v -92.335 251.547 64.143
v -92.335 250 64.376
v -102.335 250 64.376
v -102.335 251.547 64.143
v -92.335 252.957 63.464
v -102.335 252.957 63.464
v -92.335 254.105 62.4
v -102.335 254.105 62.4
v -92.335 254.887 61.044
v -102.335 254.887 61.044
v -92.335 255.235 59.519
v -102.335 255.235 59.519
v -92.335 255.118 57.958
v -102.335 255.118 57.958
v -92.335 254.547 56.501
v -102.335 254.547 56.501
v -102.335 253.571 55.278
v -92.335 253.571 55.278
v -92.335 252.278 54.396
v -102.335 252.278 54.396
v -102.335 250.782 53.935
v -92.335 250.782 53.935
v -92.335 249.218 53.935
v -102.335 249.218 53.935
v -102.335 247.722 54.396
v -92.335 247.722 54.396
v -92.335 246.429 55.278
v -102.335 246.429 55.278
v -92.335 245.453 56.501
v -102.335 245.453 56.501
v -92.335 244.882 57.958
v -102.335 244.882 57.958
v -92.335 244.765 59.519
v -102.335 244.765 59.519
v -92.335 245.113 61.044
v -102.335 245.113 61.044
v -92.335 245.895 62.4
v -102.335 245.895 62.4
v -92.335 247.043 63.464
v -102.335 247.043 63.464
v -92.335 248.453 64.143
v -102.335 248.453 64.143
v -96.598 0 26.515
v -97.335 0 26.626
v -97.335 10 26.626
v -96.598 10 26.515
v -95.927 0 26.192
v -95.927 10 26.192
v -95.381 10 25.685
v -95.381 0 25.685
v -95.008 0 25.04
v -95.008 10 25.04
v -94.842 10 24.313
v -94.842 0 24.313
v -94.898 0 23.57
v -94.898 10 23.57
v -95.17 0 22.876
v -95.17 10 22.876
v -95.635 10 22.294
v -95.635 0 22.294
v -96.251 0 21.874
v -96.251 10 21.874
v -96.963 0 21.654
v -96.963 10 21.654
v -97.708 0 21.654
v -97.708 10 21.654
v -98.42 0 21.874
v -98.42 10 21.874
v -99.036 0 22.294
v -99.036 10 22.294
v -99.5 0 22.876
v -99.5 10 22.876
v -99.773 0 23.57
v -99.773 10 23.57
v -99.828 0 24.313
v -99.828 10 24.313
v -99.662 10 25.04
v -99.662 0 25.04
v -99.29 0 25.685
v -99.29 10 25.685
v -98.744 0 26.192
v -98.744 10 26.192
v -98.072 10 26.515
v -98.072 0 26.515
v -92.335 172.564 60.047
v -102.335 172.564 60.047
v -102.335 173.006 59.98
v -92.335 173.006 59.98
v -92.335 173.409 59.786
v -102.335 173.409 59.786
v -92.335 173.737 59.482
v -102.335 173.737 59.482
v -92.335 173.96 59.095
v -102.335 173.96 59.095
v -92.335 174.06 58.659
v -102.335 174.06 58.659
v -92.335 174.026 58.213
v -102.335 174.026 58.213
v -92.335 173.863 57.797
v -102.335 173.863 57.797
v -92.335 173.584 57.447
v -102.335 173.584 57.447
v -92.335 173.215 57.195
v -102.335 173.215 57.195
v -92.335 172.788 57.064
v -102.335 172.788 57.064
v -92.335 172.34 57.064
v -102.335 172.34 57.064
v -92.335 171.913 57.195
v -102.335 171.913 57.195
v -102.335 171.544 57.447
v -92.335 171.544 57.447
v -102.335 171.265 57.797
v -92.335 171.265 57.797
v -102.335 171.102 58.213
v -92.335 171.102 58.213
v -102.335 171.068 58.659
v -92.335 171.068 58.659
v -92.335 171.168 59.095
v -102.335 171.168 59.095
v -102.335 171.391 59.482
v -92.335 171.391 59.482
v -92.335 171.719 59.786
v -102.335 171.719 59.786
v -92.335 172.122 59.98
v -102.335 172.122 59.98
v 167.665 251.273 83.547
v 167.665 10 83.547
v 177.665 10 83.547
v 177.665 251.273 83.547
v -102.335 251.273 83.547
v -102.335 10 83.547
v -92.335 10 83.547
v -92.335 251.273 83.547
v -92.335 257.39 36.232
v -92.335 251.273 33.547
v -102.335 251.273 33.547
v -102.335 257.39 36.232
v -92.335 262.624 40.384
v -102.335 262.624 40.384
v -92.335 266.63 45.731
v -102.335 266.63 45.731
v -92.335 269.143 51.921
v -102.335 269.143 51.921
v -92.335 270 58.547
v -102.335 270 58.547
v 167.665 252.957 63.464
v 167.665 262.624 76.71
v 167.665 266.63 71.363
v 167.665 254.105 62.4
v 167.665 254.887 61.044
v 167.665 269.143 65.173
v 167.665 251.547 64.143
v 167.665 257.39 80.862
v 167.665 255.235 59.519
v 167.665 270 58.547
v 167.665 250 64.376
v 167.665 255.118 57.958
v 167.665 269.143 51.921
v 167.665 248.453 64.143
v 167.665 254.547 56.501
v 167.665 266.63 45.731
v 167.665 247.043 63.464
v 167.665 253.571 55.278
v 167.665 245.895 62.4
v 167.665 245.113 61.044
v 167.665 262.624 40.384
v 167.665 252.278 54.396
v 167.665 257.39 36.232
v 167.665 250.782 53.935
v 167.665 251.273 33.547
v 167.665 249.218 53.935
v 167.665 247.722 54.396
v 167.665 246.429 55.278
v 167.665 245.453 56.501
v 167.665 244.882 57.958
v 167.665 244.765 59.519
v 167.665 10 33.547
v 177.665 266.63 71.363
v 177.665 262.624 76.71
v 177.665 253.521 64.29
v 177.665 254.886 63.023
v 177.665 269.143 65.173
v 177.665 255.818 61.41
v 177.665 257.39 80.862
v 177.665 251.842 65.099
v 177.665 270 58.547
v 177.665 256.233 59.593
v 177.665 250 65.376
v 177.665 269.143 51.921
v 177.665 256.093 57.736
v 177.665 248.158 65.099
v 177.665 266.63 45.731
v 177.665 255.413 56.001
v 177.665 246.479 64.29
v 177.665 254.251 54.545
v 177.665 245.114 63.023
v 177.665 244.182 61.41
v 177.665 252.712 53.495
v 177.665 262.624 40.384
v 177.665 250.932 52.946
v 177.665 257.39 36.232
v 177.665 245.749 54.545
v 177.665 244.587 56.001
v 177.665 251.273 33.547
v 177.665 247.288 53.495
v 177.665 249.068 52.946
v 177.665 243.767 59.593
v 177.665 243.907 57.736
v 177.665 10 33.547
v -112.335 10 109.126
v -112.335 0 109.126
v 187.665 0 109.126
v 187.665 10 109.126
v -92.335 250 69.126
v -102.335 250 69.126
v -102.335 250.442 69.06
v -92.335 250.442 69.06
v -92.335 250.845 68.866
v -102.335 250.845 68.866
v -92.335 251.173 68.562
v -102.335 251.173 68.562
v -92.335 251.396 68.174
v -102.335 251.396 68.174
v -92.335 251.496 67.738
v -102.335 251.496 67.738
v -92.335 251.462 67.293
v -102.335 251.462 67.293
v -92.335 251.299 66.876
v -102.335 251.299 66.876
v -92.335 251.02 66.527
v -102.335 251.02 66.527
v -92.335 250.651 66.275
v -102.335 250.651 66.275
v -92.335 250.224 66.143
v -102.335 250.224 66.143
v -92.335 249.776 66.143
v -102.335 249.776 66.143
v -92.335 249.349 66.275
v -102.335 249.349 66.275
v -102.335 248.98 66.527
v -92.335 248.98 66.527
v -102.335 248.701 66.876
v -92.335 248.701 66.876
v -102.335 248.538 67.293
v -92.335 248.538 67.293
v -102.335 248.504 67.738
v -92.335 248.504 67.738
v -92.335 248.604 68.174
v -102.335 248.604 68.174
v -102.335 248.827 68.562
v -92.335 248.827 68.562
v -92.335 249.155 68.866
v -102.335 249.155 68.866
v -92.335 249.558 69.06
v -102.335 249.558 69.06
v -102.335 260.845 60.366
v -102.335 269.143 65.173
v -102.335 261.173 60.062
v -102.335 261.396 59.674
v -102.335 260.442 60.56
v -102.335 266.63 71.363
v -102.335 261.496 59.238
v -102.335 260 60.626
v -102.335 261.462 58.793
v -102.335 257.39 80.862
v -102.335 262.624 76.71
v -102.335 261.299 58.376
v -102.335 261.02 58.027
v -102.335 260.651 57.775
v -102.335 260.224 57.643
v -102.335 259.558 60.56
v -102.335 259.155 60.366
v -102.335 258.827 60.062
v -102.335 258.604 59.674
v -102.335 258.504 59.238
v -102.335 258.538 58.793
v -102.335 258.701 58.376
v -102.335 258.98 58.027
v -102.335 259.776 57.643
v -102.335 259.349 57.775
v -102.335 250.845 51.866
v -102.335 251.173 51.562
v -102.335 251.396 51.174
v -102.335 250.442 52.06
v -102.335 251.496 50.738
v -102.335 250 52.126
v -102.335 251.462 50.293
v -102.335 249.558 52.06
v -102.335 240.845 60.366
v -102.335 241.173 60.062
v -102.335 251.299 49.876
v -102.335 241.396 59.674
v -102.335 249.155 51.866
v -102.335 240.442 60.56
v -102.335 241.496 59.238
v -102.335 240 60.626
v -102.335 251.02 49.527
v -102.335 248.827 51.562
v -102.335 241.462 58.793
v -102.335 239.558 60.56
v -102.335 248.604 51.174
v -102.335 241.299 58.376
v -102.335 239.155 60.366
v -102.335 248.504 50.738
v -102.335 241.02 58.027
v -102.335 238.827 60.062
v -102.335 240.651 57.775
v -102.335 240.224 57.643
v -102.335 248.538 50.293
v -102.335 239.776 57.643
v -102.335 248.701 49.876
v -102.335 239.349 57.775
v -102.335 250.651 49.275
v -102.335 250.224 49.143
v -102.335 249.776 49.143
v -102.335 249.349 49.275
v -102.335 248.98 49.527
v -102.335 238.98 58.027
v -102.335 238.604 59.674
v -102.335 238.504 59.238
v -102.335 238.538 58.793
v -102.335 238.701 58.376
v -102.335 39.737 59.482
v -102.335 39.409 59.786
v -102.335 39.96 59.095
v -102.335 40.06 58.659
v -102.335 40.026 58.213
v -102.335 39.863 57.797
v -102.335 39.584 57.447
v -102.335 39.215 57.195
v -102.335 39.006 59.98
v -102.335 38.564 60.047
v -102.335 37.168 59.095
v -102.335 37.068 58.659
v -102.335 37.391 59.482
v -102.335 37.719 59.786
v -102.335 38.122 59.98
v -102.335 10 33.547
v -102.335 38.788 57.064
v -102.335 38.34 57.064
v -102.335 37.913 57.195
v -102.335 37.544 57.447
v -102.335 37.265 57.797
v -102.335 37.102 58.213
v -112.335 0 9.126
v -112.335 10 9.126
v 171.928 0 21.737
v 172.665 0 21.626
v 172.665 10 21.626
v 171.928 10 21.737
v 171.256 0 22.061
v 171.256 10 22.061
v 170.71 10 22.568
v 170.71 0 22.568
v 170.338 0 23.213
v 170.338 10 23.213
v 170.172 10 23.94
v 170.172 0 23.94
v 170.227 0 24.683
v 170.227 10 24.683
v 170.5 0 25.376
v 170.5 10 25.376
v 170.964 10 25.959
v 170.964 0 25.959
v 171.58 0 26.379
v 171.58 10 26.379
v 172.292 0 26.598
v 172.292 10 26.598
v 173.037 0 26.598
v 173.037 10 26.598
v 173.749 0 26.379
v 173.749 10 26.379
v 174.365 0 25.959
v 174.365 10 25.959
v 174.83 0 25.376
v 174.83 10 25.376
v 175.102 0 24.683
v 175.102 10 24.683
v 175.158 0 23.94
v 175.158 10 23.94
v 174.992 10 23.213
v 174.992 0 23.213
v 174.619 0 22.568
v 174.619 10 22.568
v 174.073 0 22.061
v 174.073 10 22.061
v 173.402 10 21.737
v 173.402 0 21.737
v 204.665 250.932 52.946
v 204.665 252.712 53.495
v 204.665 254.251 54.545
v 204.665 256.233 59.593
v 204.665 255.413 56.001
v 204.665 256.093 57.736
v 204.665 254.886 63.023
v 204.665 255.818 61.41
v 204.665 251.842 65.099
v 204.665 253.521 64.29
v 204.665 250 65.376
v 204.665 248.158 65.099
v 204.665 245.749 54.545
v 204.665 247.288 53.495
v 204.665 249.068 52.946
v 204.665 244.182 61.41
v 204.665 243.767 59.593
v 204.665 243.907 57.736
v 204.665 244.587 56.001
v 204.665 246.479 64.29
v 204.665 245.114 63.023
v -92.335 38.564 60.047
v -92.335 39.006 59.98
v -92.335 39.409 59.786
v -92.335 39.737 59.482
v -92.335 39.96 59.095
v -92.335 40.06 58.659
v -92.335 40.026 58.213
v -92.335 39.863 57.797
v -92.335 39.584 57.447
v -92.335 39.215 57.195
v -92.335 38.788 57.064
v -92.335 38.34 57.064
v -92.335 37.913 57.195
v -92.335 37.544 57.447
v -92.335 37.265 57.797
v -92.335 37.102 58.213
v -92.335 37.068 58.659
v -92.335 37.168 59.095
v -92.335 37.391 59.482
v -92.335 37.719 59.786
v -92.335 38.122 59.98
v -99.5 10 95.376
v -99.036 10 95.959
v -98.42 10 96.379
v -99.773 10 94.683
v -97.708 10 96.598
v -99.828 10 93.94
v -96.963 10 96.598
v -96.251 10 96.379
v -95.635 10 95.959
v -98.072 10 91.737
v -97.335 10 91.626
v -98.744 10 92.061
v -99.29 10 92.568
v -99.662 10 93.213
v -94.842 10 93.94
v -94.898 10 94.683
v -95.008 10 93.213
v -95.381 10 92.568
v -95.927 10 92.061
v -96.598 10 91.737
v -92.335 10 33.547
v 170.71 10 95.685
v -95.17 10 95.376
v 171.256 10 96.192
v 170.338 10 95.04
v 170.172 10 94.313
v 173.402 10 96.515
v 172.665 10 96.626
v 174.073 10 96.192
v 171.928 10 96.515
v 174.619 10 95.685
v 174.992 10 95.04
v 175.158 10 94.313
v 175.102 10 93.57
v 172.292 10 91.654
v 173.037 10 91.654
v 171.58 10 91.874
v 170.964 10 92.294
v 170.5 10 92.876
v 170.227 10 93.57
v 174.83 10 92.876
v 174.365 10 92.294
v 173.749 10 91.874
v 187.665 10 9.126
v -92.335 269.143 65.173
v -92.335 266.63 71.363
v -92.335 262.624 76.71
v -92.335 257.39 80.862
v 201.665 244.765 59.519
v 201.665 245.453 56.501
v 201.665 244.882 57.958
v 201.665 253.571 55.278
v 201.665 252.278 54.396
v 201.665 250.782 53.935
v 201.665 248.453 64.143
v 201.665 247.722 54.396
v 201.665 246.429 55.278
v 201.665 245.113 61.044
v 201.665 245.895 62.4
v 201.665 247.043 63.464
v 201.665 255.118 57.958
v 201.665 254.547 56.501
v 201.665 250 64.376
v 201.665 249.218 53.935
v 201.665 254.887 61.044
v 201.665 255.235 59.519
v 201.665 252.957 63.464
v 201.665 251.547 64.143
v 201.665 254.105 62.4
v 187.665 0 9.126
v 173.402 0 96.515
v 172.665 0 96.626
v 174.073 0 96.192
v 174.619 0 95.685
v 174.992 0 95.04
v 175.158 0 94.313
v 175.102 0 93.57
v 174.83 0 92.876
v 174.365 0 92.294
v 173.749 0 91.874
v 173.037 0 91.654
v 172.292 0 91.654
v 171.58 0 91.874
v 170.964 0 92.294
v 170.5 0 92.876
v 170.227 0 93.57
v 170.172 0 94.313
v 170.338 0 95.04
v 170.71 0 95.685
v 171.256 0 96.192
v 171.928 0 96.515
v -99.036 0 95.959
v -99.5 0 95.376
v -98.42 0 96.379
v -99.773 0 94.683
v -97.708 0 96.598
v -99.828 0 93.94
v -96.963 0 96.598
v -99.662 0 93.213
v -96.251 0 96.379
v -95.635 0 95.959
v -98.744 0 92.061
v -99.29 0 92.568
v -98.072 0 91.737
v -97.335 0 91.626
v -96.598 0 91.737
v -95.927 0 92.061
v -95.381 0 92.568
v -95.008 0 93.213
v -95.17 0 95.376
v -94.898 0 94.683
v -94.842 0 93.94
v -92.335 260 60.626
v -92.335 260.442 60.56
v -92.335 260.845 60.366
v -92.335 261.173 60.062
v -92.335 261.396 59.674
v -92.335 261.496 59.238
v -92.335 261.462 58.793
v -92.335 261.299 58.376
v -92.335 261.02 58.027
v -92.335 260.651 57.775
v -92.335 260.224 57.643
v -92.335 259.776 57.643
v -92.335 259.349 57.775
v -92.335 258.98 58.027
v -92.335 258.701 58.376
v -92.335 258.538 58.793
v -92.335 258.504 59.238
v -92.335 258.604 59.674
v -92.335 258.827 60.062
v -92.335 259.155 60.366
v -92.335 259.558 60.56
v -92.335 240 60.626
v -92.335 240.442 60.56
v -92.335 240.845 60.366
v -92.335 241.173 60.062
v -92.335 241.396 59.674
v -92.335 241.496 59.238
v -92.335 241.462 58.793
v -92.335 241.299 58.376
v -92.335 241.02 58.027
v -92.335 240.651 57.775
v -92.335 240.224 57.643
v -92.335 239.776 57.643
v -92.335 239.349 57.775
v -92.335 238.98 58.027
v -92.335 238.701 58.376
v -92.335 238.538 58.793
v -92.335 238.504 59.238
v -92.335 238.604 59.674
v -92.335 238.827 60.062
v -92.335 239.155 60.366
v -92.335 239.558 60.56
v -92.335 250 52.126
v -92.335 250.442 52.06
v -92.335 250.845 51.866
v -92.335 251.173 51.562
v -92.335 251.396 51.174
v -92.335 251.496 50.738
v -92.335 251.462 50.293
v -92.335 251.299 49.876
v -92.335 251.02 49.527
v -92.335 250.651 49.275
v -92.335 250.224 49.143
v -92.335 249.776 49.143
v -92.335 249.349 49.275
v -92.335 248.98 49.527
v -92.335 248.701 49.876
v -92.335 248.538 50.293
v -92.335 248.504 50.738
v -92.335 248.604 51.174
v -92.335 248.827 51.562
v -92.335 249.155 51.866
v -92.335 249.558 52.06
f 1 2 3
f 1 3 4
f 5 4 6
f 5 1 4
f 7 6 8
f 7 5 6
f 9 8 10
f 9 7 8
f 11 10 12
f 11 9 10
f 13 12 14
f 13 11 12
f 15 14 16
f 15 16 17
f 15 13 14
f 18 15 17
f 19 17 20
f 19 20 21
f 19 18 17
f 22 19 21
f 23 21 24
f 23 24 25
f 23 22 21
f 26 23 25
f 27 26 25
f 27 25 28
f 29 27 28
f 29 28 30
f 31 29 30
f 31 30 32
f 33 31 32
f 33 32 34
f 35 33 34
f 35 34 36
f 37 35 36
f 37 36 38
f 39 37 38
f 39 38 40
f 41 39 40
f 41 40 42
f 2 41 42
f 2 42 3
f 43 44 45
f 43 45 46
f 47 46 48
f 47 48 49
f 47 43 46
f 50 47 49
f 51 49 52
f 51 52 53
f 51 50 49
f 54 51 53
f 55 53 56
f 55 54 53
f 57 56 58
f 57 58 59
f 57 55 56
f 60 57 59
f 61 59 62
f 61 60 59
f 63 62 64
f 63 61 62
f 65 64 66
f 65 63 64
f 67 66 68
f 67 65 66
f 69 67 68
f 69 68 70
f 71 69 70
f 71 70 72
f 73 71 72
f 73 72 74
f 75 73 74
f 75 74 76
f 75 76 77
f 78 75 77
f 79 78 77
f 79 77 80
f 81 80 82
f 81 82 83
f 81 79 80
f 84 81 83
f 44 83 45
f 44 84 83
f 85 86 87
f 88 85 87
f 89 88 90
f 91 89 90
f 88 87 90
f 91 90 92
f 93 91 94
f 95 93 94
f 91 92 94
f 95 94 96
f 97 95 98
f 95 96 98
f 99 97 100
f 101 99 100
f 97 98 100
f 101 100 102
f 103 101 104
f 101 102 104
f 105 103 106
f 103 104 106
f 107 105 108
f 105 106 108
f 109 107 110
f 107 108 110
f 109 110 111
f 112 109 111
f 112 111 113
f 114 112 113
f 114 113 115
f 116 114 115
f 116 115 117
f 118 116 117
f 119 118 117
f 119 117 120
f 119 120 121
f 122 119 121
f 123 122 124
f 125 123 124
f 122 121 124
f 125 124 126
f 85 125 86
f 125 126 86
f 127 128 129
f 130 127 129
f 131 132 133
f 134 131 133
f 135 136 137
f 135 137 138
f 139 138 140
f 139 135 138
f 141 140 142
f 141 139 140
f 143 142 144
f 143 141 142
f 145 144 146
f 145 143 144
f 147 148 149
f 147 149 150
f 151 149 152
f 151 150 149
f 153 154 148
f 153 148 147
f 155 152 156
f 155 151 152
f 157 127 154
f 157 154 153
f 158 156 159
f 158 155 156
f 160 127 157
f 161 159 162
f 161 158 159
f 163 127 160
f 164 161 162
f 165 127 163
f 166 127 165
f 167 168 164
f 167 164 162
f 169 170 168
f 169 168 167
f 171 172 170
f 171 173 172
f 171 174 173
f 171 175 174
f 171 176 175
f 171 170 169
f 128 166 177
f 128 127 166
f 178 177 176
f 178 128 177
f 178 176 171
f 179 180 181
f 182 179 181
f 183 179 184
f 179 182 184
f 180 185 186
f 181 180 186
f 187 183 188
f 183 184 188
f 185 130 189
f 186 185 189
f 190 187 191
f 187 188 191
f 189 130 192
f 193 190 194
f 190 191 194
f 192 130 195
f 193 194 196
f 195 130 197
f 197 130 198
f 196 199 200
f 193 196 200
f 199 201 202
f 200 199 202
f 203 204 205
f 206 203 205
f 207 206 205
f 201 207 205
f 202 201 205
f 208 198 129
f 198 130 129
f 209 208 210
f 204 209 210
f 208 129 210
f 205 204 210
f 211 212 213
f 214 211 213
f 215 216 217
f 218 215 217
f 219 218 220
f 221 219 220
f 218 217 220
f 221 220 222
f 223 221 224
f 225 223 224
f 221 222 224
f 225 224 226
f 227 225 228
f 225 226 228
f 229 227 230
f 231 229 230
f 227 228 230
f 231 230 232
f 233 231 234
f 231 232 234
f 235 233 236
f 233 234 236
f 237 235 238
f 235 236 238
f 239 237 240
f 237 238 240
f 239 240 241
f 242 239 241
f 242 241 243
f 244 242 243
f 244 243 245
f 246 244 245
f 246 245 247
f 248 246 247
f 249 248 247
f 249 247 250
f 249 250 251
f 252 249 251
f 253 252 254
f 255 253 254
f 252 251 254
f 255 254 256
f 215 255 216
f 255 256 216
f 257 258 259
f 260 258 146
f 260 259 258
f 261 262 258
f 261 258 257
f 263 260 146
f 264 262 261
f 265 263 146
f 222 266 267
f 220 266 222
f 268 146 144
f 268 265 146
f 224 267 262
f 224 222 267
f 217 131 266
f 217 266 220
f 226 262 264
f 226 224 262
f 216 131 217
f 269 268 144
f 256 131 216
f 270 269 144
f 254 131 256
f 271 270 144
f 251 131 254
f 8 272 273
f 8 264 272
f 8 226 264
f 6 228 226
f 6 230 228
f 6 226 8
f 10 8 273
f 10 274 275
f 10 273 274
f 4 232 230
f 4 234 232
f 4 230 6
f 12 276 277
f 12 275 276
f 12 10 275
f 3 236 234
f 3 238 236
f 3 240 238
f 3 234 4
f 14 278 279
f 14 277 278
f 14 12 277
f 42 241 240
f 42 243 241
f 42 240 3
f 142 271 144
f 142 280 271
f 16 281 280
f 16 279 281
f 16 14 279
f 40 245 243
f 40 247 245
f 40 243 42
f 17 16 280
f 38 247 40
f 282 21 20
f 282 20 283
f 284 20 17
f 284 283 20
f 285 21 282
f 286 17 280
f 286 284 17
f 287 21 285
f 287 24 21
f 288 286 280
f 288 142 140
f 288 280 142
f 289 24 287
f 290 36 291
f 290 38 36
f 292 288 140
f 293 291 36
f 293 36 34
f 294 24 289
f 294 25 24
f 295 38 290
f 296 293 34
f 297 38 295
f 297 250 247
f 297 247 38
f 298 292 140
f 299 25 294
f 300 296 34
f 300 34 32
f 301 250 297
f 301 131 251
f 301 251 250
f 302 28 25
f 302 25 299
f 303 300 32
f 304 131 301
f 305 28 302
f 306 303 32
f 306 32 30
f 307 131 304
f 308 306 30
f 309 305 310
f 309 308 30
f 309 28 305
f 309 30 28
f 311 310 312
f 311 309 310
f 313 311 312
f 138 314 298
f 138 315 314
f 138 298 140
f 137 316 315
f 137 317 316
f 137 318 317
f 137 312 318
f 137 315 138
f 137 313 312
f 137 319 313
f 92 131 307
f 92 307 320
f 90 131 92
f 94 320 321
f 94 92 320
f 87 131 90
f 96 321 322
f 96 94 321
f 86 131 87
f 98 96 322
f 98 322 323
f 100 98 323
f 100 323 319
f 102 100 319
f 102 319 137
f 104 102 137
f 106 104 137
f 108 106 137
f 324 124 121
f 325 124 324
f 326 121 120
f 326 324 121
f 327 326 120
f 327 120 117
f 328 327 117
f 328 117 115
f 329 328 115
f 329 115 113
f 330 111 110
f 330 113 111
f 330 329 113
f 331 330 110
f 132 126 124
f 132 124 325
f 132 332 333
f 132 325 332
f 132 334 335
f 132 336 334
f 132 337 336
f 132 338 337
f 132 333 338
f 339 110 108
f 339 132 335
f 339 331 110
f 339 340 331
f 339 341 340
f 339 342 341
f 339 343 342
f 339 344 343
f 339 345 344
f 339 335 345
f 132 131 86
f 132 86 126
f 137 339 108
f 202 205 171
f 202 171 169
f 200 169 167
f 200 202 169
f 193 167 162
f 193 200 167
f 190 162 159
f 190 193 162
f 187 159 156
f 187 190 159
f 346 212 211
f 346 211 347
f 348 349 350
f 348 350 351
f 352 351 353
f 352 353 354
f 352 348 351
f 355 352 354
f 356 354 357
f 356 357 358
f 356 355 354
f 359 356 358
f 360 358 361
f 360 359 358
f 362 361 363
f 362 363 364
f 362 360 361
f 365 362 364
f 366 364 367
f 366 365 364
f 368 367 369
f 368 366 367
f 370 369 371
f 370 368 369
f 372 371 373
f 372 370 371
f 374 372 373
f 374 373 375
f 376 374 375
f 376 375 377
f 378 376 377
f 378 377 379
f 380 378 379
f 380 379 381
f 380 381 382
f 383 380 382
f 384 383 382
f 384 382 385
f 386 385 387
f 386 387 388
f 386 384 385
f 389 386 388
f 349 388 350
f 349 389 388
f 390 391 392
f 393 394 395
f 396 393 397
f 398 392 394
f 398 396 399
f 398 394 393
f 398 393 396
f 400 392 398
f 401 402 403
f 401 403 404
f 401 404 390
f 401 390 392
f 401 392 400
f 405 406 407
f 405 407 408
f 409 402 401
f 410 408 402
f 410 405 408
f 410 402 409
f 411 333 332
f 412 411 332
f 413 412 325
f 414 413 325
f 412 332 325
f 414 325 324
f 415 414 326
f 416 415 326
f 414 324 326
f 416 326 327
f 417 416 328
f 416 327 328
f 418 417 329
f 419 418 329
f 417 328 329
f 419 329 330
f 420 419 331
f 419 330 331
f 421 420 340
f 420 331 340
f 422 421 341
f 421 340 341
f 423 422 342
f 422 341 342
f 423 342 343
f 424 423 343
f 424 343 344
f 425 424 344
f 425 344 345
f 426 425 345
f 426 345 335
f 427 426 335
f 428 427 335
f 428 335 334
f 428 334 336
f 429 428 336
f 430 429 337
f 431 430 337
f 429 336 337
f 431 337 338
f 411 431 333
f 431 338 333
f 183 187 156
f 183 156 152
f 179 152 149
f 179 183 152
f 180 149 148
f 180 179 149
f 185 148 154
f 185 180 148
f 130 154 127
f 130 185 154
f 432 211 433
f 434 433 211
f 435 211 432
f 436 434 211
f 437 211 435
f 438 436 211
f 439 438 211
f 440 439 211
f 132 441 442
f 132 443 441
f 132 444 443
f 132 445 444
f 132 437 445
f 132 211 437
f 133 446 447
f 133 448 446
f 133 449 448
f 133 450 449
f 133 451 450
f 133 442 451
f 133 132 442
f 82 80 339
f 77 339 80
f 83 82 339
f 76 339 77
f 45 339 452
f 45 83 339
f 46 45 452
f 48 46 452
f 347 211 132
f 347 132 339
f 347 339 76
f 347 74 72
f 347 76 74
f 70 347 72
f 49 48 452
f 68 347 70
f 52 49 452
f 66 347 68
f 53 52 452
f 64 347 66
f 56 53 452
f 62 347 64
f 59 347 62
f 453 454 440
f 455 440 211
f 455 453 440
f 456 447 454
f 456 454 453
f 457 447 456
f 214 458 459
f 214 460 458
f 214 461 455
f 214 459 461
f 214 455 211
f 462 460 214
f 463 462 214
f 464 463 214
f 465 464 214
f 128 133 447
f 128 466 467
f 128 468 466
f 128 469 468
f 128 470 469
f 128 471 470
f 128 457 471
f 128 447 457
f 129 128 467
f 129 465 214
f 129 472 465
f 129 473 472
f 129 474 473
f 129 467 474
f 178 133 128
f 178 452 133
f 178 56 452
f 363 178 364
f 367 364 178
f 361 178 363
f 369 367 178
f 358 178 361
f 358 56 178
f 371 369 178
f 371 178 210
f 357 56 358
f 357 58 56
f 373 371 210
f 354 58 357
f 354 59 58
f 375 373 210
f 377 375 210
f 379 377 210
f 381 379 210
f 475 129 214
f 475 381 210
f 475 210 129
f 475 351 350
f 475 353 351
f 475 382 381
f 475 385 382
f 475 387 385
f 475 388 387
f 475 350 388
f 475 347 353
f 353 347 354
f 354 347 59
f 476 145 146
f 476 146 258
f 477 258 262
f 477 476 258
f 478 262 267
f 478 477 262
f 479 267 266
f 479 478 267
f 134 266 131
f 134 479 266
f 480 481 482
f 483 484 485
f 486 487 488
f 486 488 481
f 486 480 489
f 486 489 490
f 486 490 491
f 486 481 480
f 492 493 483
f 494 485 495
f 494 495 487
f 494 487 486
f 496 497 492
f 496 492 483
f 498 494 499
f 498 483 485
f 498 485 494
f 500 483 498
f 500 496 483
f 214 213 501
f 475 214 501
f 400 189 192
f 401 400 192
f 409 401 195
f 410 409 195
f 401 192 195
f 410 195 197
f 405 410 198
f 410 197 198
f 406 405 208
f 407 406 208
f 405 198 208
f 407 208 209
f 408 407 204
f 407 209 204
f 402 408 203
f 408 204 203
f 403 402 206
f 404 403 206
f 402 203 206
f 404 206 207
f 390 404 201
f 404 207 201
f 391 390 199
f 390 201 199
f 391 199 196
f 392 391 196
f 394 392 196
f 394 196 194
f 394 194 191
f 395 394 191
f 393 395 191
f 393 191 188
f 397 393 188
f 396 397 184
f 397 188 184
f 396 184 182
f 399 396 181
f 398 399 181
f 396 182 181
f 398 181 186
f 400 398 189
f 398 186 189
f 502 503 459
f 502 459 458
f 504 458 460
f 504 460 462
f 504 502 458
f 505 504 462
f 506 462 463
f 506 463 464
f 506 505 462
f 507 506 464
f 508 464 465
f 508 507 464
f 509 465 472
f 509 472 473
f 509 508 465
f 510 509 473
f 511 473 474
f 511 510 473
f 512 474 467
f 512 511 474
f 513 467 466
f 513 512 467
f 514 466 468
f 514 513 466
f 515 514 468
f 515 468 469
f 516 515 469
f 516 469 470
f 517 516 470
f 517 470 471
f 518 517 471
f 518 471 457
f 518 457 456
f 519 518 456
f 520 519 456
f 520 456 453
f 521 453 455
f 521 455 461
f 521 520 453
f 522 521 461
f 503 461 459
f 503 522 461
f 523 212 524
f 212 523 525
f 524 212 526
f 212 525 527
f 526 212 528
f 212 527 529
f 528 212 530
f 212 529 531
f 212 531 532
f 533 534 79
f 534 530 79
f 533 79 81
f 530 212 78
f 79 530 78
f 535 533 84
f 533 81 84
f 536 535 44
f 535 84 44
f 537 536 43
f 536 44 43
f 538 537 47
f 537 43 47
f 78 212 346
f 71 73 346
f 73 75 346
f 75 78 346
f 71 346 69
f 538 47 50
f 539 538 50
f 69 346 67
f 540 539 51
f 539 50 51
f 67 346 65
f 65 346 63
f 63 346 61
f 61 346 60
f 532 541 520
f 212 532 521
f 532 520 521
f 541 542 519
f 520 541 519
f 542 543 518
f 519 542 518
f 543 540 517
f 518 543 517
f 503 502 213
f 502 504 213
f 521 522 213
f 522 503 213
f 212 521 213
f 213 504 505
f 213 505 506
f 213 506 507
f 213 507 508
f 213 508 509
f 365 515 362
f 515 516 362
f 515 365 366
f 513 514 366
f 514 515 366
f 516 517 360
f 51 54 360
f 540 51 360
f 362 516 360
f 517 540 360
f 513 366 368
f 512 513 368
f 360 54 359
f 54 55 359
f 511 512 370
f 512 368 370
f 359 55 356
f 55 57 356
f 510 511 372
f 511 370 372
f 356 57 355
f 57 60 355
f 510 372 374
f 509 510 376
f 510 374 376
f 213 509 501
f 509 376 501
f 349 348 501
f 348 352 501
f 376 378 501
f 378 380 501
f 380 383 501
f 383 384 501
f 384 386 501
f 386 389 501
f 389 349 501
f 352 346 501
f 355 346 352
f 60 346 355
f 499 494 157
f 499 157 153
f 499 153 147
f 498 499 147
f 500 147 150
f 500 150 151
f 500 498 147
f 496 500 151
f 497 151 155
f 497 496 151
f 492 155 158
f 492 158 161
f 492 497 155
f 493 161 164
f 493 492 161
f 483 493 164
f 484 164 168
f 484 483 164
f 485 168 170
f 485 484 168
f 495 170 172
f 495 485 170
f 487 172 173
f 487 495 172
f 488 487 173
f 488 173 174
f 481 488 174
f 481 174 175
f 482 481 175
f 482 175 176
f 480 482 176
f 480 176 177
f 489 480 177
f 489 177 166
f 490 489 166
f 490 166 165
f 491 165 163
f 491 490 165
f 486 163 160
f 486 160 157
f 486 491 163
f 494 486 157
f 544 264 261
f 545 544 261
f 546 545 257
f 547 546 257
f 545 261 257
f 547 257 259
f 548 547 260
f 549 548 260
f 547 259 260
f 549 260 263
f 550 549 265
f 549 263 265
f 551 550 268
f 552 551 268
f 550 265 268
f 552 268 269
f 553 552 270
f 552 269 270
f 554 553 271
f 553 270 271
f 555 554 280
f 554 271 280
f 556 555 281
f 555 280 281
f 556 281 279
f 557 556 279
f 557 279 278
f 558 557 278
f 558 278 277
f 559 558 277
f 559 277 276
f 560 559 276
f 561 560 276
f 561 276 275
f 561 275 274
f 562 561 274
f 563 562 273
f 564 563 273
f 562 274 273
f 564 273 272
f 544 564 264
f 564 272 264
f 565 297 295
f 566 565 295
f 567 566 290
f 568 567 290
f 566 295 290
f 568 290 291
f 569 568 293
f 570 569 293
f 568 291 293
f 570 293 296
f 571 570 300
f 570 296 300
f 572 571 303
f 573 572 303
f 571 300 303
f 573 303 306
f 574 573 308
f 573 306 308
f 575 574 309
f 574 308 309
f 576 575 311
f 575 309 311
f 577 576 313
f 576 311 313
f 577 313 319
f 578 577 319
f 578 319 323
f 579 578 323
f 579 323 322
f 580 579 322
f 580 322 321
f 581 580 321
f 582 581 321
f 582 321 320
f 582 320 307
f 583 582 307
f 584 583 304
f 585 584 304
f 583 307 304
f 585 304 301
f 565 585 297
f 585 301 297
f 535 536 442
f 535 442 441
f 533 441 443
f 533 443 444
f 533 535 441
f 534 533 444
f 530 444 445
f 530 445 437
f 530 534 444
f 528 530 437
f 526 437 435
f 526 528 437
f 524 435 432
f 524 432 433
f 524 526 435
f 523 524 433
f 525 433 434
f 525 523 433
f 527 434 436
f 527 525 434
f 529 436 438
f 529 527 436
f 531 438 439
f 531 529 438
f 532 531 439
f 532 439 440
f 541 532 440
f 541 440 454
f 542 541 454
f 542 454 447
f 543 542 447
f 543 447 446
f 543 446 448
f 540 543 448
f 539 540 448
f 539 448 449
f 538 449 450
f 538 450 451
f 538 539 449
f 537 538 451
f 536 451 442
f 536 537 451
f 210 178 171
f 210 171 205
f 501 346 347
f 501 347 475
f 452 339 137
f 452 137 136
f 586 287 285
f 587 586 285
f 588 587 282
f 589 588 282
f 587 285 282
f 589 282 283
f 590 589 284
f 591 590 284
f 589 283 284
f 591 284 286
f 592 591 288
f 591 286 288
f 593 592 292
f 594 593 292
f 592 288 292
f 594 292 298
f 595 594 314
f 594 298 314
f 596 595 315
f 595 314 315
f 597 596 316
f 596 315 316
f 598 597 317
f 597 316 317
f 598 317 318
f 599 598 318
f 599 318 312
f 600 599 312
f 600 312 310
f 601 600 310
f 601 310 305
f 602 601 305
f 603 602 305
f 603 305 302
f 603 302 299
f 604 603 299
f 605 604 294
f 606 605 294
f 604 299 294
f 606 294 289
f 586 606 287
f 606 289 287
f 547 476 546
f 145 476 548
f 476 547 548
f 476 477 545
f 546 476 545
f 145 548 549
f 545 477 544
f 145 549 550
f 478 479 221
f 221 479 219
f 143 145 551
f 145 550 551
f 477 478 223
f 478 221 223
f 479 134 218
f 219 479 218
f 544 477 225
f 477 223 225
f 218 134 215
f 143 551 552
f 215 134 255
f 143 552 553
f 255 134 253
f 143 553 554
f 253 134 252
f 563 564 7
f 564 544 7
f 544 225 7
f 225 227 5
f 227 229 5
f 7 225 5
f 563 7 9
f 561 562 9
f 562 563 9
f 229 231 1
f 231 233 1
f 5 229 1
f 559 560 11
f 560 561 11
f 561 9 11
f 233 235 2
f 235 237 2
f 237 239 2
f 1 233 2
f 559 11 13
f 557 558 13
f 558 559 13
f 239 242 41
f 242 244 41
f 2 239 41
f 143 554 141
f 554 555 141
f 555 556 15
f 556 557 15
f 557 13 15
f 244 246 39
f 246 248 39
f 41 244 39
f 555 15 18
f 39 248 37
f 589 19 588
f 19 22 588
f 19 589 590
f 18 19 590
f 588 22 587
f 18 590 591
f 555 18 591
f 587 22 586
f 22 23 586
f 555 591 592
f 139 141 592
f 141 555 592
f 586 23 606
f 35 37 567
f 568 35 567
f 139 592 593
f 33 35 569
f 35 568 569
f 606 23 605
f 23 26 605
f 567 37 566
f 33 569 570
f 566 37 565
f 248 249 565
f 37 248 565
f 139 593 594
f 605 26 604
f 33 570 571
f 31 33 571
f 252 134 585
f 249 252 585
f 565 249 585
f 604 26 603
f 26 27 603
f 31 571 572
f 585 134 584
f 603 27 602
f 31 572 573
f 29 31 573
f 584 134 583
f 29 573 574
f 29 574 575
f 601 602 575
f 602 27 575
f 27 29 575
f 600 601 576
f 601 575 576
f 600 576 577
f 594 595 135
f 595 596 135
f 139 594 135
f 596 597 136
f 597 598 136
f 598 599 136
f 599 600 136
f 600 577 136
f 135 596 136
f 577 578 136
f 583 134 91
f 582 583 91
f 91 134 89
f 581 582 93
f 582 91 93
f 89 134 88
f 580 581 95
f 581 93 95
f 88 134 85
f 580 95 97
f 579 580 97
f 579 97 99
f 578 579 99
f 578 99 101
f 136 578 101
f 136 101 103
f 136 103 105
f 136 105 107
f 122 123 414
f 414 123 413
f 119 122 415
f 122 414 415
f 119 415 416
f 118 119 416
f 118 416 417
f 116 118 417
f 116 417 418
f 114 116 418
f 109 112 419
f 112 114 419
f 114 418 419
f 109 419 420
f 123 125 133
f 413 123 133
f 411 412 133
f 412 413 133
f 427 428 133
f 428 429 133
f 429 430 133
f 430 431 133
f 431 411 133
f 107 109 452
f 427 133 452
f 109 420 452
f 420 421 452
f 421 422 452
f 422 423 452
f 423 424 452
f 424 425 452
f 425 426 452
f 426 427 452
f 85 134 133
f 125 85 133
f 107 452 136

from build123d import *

# Parameters (mm, degrees)
SKETCH1_W               = 300
SKETCH1_H               = 100
SKETCH1_R               = 2.5
BOSS_EXTRUDE1_DEPTH     = 10
SKETCH2_W               = 10
SKETCH2_H               = 50
BOSS_EXTRUDE2_DEPTH     = 260
SKETCH3_R               = 5.25
CUT_EXTRUDE1_DEPTH      = 20
CUT_EXTRUDE2_DEPTH      = 411.984872046
CUT_EXTRUDE2_DEPTH_BACK = 411.984872046
SKETCH5_R               = 1.5
CUT_EXTRUDE3_DEPTH      = 10
SKETCH7_R               = 1.5
CUT_EXTRUDE6_DEPTH      = 10
SKETCH8_R               = 1.5
CUT_EXTRUDE7_DEPTH      = 10
SKETCH12_R              = 6.25
BOSS_EXTRUDE4_DEPTH     = 27
CUT_EXTRUDE10_START     = -34
SKETCH13_R              = 5.25
CUT_EXTRUDE10_DEPTH     = 34


with BuildPart() as part:
    # Sketch1 → Boss-Extrude1 (new body)
    with BuildSketch(Plane(origin=(0, 0, 0), x_dir=(1, 0, 0), z_dir=(0, 1, 0))):
        with Locations((37.664745703, -59.126371929)):
            Rectangle(SKETCH1_W, SKETCH1_H)
        with Locations(Location((-97.335254297, -24.126371929, 0), (0, 0, 270))):
            Circle(SKETCH1_R, mode=Mode.SUBTRACT)
        with Locations(Location((-97.335254297, -94.126371929, 0), (0, 0, 90))):
            Circle(SKETCH1_R, mode=Mode.SUBTRACT)
        with Locations(Location((172.664745703, -24.126371929, 0), (0, 0, 90))):
            Circle(SKETCH1_R, mode=Mode.SUBTRACT)
        with Locations(Location((172.664745703, -94.126371929, 0), (0, 0, 270))):
            Circle(SKETCH1_R, mode=Mode.SUBTRACT)
    extrude(amount=BOSS_EXTRUDE1_DEPTH)

    # Sketch2 → Boss-Extrude2 (add)
    with BuildSketch(Plane(origin=(0, 10, 0), x_dir=(1, 0, 0), z_dir=(0, 1, 0))):
        with Locations((172.664745703, -58.546819536)):
            Rectangle(SKETCH2_W, SKETCH2_H)
        with Locations((-97.335254297, -58.546819536)):
            Rectangle(SKETCH2_W, SKETCH2_H)
    extrude(amount=BOSS_EXTRUDE2_DEPTH)

    # Sketch3 → Cut-Extrude1 (cut)
    with BuildSketch(Plane.ZY.offset(82.335254297)):
        with Locations((59.126371929, 250)):
            Circle(SKETCH3_R)
    extrude(amount=CUT_EXTRUDE1_DEPTH, mode=Mode.SUBTRACT)

    # Sketch4 → Cut-Extrude2 (cut, two sides: drawn at the far end of the back side and taken through both)
    with BuildSketch(Plane.ZY.offset(102.335254297).offset(-CUT_EXTRUDE2_DEPTH_BACK)):
        with BuildLine():
            Line((83.546819536, 270), (58.546819536, 270))
            ThreePointArc((58.546819536, 270), (74.165001003, 264.798991748), (83.546819536, 251.27273727))
            Line((83.546819536, 251.27273727), (83.546819536, 270))
        make_face()
        with BuildLine():
            Line((33.546819536, 270), (33.546819536, 251.27273727))
            ThreePointArc((33.546819536, 251.27273727), (42.928638069, 264.798991748), (58.546819536, 270))
            Line((58.546819536, 270), (33.546819536, 270))
        make_face()
    extrude(amount=CUT_EXTRUDE2_DEPTH + CUT_EXTRUDE2_DEPTH_BACK, mode=Mode.SUBTRACT)

    # Sketch5 → Cut-Extrude3 (cut)
    with BuildSketch(Plane.ZY.offset(102.335254297)):
        with Locations((58.546819536, 172.564056087)):
            Circle(SKETCH5_R)
        with Locations((58.546819536, 38.564056087)):
            Circle(SKETCH5_R)
    extrude(amount=-CUT_EXTRUDE3_DEPTH, mode=Mode.SUBTRACT)

    # Sketch7 → Cut-Extrude6 (cut)
    with BuildSketch(Plane.ZY.offset(102.335254297)):
        with Locations((59.126371929, 260)):
            Circle(SKETCH7_R)
        with Locations((59.126371929, 240)):
            Circle(SKETCH7_R)
    extrude(amount=-CUT_EXTRUDE6_DEPTH, mode=Mode.SUBTRACT)

    # Sketch8 → Cut-Extrude7 (cut)
    with BuildSketch(Plane.ZY.offset(102.335254297)):
        with Locations((50.626371929, 250)):
            Circle(SKETCH8_R)
        with Locations((67.626371929, 250)):
            Circle(SKETCH8_R)
    extrude(amount=-CUT_EXTRUDE7_DEPTH, mode=Mode.SUBTRACT)

    # Sketch12 → Boss-Extrude4 (add)
    with BuildSketch(Plane(origin=(177.664745703, 0, 0), x_dir=(0, 0, -1), z_dir=(1, 0, 0))):
        with Locations(Location((-59.126371929, 250, 0), (0, 0, 180))):
            Circle(SKETCH12_R)
    extrude(amount=BOSS_EXTRUDE4_DEPTH)

    # Sketch13 → Cut-Extrude10 (cut)
    with BuildSketch(Plane.ZY.offset(-167.664745703).offset(CUT_EXTRUDE10_START)):
        with Locations((59.126371929, 250)):
            Circle(SKETCH13_R)
    extrude(amount=CUT_EXTRUDE10_DEPTH, mode=Mode.SUBTRACT)


solid = part.part
